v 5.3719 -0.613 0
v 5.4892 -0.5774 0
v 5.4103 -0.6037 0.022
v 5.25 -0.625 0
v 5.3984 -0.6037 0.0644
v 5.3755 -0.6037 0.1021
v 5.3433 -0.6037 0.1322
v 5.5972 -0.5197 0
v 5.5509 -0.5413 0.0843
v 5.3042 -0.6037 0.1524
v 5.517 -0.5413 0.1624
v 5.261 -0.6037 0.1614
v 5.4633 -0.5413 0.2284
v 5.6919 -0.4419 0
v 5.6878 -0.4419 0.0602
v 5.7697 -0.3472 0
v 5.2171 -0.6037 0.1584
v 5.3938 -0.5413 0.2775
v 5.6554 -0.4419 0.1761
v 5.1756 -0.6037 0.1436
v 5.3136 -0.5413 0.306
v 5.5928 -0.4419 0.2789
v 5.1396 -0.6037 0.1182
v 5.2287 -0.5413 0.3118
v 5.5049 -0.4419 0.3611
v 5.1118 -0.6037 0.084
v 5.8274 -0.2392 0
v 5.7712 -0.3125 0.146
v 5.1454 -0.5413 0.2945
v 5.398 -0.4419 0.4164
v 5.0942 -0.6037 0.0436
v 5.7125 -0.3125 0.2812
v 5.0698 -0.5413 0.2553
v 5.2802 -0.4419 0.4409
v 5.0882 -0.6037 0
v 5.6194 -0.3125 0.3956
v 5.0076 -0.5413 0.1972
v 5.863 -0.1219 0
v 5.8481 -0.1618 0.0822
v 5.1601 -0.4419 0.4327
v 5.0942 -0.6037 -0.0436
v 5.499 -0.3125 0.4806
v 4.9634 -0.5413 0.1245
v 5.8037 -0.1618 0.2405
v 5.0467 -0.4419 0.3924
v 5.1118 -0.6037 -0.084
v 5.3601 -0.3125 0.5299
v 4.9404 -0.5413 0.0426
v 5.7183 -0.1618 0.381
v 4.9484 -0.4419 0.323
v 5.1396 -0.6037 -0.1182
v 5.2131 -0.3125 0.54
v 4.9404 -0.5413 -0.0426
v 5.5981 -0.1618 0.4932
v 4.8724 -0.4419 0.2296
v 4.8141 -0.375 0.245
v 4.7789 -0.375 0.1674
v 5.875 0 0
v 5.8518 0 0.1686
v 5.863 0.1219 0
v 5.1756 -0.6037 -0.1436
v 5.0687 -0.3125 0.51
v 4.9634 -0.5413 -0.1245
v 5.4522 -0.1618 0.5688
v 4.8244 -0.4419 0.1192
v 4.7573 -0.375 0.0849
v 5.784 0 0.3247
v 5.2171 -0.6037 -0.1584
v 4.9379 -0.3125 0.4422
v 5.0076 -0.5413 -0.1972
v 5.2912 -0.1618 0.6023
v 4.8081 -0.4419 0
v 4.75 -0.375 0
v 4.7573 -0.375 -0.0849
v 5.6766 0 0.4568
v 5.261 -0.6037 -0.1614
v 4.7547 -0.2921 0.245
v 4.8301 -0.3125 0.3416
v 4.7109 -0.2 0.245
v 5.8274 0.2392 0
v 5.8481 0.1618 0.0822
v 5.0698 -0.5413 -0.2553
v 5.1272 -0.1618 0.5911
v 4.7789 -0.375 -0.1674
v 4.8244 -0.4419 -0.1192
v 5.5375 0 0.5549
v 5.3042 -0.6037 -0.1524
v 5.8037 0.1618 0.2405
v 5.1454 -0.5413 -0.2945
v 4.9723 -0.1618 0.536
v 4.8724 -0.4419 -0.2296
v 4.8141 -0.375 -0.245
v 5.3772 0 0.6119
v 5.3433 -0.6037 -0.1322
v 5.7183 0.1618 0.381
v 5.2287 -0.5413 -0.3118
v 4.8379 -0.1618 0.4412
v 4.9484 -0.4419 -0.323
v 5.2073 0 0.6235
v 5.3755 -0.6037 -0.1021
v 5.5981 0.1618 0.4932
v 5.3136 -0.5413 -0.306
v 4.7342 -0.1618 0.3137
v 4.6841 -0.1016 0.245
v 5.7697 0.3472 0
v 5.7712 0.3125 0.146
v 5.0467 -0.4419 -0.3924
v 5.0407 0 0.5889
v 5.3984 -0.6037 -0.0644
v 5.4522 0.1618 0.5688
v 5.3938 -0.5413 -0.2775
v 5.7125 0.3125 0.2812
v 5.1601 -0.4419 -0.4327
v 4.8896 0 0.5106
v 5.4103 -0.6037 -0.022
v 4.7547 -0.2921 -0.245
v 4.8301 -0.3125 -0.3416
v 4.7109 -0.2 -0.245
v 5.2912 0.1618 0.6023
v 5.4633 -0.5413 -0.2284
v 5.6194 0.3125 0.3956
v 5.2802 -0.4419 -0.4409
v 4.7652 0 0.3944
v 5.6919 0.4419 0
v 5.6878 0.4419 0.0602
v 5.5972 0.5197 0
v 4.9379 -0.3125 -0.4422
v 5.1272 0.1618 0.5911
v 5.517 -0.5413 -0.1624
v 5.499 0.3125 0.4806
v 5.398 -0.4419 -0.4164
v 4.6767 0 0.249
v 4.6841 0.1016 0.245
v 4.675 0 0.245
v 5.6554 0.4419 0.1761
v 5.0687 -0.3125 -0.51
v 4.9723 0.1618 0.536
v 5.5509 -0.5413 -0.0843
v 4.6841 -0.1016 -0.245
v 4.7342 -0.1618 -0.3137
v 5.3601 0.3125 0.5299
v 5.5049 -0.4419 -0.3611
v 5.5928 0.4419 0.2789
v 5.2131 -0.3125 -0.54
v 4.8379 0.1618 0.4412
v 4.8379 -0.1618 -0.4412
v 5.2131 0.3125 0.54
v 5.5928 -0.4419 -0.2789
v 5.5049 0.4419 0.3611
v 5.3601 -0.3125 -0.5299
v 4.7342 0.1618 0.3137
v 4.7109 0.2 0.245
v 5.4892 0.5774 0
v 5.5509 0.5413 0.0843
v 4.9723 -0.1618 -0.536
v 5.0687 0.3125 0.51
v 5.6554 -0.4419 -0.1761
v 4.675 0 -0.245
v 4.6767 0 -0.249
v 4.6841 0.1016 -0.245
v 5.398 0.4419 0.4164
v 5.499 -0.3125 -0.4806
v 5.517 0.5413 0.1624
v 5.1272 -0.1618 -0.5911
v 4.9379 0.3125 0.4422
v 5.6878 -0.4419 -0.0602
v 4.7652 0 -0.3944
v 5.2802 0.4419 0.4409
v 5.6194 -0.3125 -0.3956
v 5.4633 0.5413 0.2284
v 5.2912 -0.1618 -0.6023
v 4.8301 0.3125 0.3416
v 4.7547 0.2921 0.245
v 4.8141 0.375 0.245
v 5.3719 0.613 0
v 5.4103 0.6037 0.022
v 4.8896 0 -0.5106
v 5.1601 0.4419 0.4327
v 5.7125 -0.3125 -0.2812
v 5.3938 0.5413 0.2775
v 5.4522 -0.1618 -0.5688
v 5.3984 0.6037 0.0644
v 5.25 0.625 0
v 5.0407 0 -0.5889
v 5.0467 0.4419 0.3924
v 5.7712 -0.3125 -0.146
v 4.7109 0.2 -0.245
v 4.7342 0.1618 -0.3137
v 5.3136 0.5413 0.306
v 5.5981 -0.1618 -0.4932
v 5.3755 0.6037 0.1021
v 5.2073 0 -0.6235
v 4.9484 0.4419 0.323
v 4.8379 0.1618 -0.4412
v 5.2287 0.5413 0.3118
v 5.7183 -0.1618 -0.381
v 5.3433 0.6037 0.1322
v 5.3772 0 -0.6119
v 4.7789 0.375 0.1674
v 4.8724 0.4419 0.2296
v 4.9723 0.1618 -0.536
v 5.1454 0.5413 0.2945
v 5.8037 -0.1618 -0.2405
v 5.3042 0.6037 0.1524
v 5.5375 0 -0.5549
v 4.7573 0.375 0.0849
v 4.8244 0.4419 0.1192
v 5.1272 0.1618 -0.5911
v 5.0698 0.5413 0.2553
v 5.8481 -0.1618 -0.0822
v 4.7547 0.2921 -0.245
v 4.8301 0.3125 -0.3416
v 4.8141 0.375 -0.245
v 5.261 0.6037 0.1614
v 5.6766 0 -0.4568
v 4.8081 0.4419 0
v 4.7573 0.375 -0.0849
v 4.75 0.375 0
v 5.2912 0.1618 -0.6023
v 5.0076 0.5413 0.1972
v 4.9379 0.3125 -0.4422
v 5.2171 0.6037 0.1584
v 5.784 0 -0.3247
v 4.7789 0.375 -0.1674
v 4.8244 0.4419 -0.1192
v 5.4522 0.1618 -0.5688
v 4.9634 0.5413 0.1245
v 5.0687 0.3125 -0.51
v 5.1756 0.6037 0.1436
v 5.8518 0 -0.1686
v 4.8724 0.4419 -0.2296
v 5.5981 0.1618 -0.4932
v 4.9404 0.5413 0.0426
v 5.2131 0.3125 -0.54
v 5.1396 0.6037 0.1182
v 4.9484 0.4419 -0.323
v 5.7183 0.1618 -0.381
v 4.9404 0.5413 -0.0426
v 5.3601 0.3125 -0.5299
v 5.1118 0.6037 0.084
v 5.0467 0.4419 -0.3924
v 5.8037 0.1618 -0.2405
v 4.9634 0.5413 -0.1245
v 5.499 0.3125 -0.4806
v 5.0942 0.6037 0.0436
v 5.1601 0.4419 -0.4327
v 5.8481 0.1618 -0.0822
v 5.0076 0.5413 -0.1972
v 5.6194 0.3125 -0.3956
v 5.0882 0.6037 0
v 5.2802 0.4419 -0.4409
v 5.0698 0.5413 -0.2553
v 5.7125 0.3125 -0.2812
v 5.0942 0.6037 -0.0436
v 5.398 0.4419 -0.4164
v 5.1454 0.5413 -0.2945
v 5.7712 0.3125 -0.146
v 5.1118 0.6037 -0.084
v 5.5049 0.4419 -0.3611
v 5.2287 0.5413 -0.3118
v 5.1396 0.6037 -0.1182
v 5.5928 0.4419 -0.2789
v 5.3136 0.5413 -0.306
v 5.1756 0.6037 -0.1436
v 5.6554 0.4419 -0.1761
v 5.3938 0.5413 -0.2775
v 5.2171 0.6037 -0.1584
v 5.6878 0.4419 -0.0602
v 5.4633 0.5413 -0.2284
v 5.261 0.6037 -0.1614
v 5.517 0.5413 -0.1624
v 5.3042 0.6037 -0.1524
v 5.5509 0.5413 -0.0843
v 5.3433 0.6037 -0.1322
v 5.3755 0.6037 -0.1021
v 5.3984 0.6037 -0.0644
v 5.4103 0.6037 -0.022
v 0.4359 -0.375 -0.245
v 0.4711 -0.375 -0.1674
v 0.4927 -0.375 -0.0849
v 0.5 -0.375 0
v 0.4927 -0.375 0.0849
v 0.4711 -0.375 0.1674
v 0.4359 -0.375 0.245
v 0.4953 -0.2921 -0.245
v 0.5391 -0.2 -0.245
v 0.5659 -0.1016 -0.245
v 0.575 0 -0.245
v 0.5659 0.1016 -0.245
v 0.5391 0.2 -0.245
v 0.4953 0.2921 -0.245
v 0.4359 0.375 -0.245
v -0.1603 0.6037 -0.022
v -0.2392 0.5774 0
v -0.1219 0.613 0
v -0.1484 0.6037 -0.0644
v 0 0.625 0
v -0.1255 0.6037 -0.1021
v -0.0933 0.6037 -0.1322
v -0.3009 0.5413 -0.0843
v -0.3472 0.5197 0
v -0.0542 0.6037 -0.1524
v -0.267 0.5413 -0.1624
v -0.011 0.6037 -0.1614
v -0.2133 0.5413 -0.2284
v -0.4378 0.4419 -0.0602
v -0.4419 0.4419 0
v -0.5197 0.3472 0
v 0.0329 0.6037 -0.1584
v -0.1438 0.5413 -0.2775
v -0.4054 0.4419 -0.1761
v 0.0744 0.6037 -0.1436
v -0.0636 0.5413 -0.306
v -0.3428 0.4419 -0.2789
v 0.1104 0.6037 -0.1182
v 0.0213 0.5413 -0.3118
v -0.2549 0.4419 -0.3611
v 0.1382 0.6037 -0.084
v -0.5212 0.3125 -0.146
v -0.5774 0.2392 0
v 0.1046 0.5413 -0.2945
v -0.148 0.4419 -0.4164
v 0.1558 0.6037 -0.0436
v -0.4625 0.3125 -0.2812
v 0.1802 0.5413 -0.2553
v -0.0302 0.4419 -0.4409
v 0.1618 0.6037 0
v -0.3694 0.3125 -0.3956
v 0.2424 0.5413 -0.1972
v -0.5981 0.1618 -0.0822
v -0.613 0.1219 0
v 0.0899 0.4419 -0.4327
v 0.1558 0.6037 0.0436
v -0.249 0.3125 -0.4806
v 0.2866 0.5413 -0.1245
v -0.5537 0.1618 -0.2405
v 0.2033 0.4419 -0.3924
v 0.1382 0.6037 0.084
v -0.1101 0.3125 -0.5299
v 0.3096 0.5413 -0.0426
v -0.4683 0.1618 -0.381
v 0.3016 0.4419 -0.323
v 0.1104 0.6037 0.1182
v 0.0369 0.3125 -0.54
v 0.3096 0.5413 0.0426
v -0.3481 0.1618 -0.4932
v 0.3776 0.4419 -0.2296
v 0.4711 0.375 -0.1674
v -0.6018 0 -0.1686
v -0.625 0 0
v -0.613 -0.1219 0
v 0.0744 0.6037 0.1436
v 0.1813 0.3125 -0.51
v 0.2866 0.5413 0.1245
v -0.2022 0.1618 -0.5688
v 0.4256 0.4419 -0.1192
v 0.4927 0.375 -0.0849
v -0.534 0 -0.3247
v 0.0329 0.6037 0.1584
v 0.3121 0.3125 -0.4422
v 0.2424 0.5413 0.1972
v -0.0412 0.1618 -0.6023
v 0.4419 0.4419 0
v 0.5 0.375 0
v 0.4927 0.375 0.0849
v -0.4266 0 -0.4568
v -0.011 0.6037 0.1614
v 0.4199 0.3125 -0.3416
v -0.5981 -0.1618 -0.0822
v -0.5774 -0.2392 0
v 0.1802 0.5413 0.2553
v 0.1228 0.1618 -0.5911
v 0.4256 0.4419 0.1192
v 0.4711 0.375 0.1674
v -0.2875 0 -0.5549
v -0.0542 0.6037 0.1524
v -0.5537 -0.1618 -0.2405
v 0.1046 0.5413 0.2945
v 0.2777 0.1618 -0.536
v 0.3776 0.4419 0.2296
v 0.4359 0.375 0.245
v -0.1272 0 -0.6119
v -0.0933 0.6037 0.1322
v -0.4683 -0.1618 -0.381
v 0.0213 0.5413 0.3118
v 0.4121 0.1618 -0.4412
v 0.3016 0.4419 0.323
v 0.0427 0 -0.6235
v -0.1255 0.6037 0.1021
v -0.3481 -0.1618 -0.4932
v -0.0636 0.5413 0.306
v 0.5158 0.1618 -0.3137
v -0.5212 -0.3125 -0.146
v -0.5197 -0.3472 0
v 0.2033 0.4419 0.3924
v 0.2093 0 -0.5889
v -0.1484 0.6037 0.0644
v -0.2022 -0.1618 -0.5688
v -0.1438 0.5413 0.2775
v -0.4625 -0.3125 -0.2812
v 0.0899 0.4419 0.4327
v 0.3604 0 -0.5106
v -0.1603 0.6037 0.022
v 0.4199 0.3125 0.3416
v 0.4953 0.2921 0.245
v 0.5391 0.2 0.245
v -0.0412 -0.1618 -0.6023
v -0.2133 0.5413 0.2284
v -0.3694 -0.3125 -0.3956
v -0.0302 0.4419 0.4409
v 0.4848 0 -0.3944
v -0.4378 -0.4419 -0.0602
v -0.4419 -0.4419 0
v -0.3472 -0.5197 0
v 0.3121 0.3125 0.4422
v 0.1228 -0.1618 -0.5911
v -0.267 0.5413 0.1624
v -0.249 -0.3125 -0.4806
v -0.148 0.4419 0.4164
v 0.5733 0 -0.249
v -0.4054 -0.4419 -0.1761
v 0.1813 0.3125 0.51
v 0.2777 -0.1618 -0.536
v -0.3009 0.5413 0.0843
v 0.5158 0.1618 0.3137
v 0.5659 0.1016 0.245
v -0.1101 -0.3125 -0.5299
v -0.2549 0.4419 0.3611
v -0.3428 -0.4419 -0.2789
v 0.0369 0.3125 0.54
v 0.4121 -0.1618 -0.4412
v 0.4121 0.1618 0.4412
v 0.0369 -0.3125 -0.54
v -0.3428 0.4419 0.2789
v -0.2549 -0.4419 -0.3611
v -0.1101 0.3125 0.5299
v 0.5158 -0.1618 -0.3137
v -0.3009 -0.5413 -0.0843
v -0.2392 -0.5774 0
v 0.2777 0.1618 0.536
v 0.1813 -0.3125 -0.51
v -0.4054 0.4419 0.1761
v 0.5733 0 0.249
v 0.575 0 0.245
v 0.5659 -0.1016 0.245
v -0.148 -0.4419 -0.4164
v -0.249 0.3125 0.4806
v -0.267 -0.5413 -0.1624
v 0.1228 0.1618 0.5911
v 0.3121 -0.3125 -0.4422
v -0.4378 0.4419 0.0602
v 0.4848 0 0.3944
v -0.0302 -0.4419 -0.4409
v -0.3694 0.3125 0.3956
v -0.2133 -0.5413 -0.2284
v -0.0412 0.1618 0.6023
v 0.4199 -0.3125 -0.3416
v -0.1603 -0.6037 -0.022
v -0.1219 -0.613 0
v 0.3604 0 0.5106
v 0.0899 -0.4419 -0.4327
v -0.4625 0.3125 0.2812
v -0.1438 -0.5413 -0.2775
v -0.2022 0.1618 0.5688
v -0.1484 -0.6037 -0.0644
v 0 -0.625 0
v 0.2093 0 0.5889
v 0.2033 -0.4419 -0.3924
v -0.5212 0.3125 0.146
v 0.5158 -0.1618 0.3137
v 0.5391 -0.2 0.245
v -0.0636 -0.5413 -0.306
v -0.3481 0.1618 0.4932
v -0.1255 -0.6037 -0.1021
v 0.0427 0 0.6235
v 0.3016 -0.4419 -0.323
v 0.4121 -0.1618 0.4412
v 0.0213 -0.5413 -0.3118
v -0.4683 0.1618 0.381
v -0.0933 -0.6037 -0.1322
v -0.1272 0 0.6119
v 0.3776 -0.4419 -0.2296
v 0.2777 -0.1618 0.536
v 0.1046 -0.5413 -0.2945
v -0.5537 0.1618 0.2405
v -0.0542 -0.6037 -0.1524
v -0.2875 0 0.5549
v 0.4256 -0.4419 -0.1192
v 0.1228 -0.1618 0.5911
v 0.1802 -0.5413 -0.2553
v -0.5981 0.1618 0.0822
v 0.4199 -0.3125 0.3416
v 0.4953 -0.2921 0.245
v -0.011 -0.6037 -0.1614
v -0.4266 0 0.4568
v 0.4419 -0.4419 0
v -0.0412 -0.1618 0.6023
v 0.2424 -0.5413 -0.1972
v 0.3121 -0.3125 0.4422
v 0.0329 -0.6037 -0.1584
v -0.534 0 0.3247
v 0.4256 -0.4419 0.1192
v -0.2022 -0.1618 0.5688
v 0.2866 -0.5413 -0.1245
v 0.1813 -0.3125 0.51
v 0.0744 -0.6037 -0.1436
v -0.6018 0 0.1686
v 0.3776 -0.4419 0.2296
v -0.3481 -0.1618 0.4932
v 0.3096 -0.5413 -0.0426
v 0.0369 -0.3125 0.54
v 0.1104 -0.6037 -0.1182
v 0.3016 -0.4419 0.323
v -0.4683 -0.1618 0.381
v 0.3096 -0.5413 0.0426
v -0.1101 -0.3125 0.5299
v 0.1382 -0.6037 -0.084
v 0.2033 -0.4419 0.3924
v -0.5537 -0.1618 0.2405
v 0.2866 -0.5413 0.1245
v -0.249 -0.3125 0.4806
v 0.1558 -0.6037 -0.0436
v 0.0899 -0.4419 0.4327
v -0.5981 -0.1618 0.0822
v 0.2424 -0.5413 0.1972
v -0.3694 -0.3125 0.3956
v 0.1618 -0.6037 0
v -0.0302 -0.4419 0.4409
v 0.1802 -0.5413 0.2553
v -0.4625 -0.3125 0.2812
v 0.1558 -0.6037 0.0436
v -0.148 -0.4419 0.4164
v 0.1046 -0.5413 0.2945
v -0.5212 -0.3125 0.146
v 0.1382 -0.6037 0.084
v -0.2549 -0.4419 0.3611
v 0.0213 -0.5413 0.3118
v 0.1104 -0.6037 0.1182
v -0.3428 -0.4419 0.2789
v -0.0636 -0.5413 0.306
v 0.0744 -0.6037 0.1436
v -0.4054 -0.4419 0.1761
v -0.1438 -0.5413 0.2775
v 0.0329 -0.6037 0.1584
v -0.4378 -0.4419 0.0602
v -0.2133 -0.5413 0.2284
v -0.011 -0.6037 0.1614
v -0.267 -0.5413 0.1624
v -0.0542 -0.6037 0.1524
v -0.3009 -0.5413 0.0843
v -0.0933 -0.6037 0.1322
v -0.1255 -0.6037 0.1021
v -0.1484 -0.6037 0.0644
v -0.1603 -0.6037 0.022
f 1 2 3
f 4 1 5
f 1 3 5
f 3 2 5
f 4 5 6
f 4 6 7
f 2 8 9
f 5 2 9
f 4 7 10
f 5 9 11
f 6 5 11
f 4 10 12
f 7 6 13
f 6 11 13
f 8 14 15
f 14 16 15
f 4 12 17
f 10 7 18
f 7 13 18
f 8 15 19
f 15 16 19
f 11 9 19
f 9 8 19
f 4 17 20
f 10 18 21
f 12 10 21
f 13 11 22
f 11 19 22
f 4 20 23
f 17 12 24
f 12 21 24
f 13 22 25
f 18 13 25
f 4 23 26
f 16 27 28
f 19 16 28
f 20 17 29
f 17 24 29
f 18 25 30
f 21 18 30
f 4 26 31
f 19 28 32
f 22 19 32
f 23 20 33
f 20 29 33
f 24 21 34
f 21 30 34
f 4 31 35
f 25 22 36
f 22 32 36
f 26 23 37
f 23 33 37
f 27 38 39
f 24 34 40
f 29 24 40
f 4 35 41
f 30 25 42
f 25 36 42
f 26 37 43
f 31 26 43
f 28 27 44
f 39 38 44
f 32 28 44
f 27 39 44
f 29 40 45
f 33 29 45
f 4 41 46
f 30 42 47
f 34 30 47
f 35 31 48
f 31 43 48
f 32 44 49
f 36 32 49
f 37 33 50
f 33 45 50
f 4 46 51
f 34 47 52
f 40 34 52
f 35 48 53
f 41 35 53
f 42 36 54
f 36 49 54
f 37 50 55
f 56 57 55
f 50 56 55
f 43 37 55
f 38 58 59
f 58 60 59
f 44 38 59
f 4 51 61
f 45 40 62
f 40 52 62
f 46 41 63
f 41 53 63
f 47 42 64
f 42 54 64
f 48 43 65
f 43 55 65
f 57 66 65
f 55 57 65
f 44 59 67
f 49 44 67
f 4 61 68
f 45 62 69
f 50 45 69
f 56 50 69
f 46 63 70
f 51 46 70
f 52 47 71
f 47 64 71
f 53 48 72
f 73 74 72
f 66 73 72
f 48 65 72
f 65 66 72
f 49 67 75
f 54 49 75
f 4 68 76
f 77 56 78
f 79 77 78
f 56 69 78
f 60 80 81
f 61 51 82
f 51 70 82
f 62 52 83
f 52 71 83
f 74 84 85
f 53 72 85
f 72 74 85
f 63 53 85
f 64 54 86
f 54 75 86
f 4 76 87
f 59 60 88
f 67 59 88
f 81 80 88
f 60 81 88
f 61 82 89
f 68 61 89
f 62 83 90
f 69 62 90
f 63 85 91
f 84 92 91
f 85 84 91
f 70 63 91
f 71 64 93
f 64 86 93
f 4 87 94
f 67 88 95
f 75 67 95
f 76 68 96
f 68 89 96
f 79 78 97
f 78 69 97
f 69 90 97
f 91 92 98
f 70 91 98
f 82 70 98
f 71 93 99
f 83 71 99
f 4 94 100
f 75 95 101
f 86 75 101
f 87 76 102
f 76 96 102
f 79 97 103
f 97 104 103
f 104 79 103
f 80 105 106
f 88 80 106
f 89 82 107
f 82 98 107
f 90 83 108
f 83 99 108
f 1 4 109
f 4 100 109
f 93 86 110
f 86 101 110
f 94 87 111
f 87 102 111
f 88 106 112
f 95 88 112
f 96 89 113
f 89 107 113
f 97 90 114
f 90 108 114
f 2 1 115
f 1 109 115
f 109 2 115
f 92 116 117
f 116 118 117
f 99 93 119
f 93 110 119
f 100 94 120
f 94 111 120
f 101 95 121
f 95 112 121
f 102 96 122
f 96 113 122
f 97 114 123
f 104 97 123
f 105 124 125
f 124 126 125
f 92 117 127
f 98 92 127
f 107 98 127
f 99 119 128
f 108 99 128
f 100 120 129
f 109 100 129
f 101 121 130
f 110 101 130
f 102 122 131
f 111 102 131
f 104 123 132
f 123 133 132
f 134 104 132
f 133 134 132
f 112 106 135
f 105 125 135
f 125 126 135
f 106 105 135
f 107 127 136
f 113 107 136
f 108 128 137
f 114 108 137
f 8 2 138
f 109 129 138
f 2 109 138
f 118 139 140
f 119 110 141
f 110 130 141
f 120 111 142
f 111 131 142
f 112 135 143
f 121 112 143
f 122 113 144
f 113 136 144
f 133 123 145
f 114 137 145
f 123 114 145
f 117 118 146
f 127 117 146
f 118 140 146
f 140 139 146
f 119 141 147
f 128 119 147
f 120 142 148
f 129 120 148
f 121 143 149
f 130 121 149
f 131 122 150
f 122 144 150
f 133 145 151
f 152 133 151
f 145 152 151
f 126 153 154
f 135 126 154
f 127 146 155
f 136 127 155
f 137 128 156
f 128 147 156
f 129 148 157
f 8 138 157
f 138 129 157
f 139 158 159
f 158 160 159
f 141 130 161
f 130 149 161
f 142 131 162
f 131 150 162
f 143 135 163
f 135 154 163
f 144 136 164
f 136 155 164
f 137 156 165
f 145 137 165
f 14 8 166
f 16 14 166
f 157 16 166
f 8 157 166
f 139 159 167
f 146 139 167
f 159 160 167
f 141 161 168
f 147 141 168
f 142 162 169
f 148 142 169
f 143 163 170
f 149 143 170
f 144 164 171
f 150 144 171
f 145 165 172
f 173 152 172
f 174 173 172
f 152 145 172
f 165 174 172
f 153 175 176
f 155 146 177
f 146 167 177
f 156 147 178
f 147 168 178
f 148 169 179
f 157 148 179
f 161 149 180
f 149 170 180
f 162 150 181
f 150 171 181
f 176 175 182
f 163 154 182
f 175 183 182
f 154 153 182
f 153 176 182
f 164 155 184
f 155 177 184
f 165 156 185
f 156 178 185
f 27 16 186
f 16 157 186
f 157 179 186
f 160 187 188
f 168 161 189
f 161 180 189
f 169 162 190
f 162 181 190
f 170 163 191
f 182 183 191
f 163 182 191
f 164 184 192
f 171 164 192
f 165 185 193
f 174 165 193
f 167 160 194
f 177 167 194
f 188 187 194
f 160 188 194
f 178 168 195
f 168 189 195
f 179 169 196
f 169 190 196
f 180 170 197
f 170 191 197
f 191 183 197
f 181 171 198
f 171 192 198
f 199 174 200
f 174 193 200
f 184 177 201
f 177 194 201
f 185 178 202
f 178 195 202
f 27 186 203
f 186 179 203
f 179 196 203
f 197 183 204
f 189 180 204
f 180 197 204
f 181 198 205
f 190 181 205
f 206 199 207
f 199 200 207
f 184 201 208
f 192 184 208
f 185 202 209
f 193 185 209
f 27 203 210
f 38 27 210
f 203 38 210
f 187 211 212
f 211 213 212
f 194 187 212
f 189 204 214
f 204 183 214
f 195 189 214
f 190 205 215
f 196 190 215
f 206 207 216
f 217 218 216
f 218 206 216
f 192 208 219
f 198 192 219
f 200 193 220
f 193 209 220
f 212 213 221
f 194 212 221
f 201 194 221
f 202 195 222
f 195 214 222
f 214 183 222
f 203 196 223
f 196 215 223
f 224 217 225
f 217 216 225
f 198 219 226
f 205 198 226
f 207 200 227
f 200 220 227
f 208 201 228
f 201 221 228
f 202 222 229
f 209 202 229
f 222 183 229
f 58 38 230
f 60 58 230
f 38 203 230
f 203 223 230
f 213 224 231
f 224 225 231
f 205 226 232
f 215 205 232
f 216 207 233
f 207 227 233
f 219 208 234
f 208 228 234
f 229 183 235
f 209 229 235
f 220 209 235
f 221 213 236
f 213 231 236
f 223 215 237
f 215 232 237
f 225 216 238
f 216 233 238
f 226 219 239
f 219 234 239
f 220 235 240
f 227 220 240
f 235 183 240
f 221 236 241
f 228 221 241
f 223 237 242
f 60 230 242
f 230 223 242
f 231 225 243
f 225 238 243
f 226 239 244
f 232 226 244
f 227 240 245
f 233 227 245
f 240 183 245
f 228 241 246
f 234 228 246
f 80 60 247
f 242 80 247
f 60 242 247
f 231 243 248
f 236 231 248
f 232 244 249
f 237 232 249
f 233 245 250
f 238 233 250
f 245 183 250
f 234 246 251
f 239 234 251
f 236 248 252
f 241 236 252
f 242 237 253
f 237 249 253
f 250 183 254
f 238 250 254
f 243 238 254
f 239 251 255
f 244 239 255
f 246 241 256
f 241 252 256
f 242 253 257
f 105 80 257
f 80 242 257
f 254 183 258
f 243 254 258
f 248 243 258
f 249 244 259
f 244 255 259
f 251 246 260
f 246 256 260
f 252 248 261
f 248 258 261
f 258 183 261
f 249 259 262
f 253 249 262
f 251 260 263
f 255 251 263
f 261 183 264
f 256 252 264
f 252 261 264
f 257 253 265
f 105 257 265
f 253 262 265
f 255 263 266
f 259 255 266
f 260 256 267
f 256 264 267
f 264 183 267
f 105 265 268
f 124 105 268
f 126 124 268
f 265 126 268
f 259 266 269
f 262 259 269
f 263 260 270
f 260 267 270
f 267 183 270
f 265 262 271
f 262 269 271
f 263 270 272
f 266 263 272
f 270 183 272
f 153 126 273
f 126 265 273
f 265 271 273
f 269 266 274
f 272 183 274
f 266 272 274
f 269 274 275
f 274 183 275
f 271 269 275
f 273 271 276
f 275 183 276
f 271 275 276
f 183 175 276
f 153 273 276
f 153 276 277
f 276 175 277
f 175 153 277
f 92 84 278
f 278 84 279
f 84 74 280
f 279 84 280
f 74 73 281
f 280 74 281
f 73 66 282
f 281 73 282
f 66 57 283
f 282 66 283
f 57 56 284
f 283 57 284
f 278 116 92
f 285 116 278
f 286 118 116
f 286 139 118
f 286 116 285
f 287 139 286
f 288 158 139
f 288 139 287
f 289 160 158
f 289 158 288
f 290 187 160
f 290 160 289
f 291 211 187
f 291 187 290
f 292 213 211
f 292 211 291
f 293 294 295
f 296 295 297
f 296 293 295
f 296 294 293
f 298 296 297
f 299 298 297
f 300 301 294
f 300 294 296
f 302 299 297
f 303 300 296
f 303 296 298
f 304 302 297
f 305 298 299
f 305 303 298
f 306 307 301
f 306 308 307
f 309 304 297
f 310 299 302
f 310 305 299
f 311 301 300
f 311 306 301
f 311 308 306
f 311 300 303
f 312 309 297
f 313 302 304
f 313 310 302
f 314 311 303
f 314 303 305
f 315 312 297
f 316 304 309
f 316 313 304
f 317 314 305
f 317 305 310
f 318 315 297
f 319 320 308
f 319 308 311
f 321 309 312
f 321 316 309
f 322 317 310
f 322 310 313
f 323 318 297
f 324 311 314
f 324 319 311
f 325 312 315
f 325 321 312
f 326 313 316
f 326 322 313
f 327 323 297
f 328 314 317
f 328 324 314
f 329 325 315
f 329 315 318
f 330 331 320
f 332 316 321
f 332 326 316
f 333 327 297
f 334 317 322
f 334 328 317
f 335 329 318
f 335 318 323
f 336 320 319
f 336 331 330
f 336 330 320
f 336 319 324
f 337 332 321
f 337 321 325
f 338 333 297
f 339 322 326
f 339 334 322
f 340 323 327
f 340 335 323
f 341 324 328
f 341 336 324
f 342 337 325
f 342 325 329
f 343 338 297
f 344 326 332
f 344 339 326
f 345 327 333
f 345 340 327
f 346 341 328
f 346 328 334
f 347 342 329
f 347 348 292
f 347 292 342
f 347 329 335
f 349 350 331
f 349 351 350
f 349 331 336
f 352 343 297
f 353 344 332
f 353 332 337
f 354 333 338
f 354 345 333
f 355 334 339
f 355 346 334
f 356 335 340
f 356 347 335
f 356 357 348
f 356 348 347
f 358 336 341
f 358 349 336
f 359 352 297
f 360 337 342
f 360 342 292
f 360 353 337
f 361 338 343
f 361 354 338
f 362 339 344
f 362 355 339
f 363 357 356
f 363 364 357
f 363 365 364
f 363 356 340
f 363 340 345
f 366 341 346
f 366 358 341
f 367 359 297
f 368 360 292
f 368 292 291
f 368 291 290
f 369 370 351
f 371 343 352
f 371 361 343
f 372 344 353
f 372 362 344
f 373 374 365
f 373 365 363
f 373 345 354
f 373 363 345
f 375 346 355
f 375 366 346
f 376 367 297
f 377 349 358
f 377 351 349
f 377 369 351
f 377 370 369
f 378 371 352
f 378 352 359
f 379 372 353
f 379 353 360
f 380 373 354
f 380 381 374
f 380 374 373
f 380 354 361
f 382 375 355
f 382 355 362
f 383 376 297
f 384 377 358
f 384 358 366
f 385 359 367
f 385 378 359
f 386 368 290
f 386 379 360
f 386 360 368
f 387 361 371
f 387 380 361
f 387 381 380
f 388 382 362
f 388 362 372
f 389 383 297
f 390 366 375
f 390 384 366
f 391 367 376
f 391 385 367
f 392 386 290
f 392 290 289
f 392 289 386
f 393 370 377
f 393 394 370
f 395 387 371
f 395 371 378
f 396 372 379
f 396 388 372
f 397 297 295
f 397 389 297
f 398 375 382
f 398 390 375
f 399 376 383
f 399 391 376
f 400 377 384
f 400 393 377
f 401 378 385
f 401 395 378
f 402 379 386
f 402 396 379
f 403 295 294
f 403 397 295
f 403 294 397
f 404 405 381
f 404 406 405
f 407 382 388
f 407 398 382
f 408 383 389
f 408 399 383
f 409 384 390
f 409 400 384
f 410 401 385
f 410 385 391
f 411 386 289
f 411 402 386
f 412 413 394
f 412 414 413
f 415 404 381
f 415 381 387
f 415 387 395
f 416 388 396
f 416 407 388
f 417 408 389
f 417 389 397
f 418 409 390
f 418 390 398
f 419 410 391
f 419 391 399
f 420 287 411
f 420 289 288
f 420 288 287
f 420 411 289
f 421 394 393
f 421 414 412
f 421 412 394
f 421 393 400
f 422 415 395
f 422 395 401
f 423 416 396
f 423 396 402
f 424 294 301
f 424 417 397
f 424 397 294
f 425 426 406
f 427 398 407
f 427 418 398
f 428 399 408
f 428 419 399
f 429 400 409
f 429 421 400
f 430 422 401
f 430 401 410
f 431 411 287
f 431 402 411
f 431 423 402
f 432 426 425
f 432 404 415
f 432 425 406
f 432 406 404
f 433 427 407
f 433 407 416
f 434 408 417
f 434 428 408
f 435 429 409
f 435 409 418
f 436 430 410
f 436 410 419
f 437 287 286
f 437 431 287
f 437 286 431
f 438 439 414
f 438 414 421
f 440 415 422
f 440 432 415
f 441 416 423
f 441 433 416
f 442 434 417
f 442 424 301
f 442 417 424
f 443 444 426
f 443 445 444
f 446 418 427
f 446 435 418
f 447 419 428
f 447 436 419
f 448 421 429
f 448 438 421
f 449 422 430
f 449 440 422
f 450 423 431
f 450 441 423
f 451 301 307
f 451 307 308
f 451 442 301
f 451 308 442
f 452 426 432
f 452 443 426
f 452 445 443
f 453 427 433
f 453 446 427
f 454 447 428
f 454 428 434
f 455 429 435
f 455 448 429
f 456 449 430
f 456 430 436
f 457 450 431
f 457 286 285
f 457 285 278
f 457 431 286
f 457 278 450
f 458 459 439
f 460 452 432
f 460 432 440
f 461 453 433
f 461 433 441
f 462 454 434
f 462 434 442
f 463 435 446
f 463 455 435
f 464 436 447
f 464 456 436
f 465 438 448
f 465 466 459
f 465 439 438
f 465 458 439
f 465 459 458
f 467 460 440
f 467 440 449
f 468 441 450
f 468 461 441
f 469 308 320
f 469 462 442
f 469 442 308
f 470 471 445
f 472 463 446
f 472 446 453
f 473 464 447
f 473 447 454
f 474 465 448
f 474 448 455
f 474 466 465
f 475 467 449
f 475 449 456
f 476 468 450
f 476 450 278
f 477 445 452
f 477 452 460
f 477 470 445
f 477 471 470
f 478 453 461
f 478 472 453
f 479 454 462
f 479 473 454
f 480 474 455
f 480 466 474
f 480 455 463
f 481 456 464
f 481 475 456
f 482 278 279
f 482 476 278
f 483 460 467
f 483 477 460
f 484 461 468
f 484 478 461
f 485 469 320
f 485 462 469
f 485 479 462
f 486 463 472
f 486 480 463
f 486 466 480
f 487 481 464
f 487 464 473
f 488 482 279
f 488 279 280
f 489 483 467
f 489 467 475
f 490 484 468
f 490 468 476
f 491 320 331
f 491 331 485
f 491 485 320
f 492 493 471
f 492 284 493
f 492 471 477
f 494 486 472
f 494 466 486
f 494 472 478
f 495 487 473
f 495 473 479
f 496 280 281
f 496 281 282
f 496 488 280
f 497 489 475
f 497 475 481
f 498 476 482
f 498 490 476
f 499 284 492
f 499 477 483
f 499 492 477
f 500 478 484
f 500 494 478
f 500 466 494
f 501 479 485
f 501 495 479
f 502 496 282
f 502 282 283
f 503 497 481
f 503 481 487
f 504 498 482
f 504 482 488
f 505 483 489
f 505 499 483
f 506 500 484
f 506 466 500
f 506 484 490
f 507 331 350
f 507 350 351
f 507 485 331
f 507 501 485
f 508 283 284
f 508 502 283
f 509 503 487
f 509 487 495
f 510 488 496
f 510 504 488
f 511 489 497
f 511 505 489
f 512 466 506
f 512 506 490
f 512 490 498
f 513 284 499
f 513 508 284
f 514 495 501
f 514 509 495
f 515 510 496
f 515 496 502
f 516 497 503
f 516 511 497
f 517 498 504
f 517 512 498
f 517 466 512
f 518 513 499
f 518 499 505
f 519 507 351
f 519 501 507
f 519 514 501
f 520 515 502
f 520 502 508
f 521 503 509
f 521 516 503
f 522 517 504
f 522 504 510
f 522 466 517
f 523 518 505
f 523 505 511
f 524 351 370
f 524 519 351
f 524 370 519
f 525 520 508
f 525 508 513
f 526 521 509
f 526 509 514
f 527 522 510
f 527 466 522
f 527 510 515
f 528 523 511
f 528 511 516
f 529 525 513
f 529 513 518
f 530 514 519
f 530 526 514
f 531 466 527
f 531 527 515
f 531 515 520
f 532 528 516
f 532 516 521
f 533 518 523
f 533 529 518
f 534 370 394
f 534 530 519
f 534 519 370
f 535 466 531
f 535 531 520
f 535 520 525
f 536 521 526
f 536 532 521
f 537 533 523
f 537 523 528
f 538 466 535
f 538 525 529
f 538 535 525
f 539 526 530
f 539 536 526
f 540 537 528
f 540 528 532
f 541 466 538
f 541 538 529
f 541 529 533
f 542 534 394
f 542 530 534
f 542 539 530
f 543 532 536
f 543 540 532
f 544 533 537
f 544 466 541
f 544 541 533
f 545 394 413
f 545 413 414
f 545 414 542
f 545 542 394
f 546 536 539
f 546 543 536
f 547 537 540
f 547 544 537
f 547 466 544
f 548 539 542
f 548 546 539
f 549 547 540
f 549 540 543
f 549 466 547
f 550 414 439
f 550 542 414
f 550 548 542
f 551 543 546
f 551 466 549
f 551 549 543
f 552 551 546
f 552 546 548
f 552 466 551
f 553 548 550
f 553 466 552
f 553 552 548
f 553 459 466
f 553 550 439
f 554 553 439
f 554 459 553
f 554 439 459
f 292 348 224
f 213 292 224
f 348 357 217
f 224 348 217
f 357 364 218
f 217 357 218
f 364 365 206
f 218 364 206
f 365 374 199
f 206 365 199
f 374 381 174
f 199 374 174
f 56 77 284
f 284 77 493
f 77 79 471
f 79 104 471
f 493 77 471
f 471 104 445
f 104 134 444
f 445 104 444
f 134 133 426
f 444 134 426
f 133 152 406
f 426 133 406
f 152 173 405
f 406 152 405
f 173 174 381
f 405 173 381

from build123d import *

# Parameters (mm, degrees)
PAD_DEPTH = 0.245


with BuildPart() as part:
    # Sketch → Pad (new body, symmetric)
    with BuildSketch(Plane.XY):
        with BuildLine():
            Line((0, 0.375), (5.25, 0.375))
            ThreePointArc((5.25, -0.375), (5.625, 0), (5.25, 0.375))
            Line((5.25, -0.375), (0, -0.375))
            ThreePointArc((0, 0.375), (-0.375, 0), (0, -0.375))
        make_face()
    extrude(amount=PAD_DEPTH, both=True)

    # Sketch001 → Revolution (revolve)
    with BuildSketch(Plane.XY):
        with BuildLine():
            Line((0, 0.625), (0, 0))
            Line((0, 0), (0, -0.625))
            ThreePointArc((0, 0.625), (-0.625, 0), (0, -0.625))
        make_face()
    revolve(axis=Axis((0, 0, 0), (0, -1, 0)))

    # Sketch002 → Revolution001 (revolve)
    with BuildSketch(Plane.XY):
        with BuildLine():
            ThreePointArc((5.25, -0.625), (5.875, 0), (5.25, 0.625))
            Line((5.25, 0.625), (5.25, 0))
            Line((5.25, 0), (5.25, -0.625))
        make_face()
    revolve(axis=Axis((5.25, 0, 0), (0, -1, 0)))


solid = part.part
